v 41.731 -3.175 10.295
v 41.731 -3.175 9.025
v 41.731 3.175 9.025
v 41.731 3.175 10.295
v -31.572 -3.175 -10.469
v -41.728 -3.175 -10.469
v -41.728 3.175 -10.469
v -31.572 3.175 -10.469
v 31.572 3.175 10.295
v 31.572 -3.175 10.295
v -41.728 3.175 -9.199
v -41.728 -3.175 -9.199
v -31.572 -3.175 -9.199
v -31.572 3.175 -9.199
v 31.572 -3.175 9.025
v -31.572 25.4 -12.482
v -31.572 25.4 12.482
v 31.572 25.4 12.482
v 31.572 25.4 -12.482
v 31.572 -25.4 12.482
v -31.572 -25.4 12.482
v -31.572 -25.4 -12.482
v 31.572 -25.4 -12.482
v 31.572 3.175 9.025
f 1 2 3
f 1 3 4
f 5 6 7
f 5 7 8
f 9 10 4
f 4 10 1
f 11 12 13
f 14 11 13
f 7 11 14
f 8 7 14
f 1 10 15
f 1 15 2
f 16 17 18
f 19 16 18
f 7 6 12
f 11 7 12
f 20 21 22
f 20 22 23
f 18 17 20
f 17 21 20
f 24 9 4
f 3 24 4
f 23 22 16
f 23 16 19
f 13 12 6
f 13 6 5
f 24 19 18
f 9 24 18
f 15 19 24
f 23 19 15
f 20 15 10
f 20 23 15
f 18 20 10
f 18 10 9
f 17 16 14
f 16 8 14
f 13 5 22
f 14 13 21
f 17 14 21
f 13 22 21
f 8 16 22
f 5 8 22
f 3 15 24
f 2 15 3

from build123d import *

# Parameters (mm, degrees)
F0_W     = 63.144043088
F0_H     = 24.9639227986
F1_DEPTH = 25.4
F2_W     = 10.16
F2_H     = 1.27
F3_DEPTH = 3.175
F4_W     = 10.16
F4_H     = 1.27
F5_DEPTH = 3.175


# Not quite as in the source:
# - a feature names something its author has since deleted; it is built from what else it names


with BuildPart() as f1:
    # F0 (on Front) → F1 (new body, symmetric)
    with BuildSketch(Plane.XZ):
        Rectangle(F0_W, F0_H)
    extrude(amount=F1_DEPTH, both=True)

    # F2 (on Front) → F3 (join, symmetric)
    with BuildSketch(Plane.XZ):
        with Locations((36.6514939815, 9.6600476645)):
            Rectangle(F2_W, F2_H)
    extrude(amount=F3_DEPTH, both=True)

    # F4 (on Front) → F5 (join, symmetric)
    with BuildSketch(Plane.XZ):
        with Locations((-36.6476550698, -9.8343824477)):
            Rectangle(F4_W, F4_H)
    extrude(amount=F5_DEPTH, both=True)


solid = f1.part
